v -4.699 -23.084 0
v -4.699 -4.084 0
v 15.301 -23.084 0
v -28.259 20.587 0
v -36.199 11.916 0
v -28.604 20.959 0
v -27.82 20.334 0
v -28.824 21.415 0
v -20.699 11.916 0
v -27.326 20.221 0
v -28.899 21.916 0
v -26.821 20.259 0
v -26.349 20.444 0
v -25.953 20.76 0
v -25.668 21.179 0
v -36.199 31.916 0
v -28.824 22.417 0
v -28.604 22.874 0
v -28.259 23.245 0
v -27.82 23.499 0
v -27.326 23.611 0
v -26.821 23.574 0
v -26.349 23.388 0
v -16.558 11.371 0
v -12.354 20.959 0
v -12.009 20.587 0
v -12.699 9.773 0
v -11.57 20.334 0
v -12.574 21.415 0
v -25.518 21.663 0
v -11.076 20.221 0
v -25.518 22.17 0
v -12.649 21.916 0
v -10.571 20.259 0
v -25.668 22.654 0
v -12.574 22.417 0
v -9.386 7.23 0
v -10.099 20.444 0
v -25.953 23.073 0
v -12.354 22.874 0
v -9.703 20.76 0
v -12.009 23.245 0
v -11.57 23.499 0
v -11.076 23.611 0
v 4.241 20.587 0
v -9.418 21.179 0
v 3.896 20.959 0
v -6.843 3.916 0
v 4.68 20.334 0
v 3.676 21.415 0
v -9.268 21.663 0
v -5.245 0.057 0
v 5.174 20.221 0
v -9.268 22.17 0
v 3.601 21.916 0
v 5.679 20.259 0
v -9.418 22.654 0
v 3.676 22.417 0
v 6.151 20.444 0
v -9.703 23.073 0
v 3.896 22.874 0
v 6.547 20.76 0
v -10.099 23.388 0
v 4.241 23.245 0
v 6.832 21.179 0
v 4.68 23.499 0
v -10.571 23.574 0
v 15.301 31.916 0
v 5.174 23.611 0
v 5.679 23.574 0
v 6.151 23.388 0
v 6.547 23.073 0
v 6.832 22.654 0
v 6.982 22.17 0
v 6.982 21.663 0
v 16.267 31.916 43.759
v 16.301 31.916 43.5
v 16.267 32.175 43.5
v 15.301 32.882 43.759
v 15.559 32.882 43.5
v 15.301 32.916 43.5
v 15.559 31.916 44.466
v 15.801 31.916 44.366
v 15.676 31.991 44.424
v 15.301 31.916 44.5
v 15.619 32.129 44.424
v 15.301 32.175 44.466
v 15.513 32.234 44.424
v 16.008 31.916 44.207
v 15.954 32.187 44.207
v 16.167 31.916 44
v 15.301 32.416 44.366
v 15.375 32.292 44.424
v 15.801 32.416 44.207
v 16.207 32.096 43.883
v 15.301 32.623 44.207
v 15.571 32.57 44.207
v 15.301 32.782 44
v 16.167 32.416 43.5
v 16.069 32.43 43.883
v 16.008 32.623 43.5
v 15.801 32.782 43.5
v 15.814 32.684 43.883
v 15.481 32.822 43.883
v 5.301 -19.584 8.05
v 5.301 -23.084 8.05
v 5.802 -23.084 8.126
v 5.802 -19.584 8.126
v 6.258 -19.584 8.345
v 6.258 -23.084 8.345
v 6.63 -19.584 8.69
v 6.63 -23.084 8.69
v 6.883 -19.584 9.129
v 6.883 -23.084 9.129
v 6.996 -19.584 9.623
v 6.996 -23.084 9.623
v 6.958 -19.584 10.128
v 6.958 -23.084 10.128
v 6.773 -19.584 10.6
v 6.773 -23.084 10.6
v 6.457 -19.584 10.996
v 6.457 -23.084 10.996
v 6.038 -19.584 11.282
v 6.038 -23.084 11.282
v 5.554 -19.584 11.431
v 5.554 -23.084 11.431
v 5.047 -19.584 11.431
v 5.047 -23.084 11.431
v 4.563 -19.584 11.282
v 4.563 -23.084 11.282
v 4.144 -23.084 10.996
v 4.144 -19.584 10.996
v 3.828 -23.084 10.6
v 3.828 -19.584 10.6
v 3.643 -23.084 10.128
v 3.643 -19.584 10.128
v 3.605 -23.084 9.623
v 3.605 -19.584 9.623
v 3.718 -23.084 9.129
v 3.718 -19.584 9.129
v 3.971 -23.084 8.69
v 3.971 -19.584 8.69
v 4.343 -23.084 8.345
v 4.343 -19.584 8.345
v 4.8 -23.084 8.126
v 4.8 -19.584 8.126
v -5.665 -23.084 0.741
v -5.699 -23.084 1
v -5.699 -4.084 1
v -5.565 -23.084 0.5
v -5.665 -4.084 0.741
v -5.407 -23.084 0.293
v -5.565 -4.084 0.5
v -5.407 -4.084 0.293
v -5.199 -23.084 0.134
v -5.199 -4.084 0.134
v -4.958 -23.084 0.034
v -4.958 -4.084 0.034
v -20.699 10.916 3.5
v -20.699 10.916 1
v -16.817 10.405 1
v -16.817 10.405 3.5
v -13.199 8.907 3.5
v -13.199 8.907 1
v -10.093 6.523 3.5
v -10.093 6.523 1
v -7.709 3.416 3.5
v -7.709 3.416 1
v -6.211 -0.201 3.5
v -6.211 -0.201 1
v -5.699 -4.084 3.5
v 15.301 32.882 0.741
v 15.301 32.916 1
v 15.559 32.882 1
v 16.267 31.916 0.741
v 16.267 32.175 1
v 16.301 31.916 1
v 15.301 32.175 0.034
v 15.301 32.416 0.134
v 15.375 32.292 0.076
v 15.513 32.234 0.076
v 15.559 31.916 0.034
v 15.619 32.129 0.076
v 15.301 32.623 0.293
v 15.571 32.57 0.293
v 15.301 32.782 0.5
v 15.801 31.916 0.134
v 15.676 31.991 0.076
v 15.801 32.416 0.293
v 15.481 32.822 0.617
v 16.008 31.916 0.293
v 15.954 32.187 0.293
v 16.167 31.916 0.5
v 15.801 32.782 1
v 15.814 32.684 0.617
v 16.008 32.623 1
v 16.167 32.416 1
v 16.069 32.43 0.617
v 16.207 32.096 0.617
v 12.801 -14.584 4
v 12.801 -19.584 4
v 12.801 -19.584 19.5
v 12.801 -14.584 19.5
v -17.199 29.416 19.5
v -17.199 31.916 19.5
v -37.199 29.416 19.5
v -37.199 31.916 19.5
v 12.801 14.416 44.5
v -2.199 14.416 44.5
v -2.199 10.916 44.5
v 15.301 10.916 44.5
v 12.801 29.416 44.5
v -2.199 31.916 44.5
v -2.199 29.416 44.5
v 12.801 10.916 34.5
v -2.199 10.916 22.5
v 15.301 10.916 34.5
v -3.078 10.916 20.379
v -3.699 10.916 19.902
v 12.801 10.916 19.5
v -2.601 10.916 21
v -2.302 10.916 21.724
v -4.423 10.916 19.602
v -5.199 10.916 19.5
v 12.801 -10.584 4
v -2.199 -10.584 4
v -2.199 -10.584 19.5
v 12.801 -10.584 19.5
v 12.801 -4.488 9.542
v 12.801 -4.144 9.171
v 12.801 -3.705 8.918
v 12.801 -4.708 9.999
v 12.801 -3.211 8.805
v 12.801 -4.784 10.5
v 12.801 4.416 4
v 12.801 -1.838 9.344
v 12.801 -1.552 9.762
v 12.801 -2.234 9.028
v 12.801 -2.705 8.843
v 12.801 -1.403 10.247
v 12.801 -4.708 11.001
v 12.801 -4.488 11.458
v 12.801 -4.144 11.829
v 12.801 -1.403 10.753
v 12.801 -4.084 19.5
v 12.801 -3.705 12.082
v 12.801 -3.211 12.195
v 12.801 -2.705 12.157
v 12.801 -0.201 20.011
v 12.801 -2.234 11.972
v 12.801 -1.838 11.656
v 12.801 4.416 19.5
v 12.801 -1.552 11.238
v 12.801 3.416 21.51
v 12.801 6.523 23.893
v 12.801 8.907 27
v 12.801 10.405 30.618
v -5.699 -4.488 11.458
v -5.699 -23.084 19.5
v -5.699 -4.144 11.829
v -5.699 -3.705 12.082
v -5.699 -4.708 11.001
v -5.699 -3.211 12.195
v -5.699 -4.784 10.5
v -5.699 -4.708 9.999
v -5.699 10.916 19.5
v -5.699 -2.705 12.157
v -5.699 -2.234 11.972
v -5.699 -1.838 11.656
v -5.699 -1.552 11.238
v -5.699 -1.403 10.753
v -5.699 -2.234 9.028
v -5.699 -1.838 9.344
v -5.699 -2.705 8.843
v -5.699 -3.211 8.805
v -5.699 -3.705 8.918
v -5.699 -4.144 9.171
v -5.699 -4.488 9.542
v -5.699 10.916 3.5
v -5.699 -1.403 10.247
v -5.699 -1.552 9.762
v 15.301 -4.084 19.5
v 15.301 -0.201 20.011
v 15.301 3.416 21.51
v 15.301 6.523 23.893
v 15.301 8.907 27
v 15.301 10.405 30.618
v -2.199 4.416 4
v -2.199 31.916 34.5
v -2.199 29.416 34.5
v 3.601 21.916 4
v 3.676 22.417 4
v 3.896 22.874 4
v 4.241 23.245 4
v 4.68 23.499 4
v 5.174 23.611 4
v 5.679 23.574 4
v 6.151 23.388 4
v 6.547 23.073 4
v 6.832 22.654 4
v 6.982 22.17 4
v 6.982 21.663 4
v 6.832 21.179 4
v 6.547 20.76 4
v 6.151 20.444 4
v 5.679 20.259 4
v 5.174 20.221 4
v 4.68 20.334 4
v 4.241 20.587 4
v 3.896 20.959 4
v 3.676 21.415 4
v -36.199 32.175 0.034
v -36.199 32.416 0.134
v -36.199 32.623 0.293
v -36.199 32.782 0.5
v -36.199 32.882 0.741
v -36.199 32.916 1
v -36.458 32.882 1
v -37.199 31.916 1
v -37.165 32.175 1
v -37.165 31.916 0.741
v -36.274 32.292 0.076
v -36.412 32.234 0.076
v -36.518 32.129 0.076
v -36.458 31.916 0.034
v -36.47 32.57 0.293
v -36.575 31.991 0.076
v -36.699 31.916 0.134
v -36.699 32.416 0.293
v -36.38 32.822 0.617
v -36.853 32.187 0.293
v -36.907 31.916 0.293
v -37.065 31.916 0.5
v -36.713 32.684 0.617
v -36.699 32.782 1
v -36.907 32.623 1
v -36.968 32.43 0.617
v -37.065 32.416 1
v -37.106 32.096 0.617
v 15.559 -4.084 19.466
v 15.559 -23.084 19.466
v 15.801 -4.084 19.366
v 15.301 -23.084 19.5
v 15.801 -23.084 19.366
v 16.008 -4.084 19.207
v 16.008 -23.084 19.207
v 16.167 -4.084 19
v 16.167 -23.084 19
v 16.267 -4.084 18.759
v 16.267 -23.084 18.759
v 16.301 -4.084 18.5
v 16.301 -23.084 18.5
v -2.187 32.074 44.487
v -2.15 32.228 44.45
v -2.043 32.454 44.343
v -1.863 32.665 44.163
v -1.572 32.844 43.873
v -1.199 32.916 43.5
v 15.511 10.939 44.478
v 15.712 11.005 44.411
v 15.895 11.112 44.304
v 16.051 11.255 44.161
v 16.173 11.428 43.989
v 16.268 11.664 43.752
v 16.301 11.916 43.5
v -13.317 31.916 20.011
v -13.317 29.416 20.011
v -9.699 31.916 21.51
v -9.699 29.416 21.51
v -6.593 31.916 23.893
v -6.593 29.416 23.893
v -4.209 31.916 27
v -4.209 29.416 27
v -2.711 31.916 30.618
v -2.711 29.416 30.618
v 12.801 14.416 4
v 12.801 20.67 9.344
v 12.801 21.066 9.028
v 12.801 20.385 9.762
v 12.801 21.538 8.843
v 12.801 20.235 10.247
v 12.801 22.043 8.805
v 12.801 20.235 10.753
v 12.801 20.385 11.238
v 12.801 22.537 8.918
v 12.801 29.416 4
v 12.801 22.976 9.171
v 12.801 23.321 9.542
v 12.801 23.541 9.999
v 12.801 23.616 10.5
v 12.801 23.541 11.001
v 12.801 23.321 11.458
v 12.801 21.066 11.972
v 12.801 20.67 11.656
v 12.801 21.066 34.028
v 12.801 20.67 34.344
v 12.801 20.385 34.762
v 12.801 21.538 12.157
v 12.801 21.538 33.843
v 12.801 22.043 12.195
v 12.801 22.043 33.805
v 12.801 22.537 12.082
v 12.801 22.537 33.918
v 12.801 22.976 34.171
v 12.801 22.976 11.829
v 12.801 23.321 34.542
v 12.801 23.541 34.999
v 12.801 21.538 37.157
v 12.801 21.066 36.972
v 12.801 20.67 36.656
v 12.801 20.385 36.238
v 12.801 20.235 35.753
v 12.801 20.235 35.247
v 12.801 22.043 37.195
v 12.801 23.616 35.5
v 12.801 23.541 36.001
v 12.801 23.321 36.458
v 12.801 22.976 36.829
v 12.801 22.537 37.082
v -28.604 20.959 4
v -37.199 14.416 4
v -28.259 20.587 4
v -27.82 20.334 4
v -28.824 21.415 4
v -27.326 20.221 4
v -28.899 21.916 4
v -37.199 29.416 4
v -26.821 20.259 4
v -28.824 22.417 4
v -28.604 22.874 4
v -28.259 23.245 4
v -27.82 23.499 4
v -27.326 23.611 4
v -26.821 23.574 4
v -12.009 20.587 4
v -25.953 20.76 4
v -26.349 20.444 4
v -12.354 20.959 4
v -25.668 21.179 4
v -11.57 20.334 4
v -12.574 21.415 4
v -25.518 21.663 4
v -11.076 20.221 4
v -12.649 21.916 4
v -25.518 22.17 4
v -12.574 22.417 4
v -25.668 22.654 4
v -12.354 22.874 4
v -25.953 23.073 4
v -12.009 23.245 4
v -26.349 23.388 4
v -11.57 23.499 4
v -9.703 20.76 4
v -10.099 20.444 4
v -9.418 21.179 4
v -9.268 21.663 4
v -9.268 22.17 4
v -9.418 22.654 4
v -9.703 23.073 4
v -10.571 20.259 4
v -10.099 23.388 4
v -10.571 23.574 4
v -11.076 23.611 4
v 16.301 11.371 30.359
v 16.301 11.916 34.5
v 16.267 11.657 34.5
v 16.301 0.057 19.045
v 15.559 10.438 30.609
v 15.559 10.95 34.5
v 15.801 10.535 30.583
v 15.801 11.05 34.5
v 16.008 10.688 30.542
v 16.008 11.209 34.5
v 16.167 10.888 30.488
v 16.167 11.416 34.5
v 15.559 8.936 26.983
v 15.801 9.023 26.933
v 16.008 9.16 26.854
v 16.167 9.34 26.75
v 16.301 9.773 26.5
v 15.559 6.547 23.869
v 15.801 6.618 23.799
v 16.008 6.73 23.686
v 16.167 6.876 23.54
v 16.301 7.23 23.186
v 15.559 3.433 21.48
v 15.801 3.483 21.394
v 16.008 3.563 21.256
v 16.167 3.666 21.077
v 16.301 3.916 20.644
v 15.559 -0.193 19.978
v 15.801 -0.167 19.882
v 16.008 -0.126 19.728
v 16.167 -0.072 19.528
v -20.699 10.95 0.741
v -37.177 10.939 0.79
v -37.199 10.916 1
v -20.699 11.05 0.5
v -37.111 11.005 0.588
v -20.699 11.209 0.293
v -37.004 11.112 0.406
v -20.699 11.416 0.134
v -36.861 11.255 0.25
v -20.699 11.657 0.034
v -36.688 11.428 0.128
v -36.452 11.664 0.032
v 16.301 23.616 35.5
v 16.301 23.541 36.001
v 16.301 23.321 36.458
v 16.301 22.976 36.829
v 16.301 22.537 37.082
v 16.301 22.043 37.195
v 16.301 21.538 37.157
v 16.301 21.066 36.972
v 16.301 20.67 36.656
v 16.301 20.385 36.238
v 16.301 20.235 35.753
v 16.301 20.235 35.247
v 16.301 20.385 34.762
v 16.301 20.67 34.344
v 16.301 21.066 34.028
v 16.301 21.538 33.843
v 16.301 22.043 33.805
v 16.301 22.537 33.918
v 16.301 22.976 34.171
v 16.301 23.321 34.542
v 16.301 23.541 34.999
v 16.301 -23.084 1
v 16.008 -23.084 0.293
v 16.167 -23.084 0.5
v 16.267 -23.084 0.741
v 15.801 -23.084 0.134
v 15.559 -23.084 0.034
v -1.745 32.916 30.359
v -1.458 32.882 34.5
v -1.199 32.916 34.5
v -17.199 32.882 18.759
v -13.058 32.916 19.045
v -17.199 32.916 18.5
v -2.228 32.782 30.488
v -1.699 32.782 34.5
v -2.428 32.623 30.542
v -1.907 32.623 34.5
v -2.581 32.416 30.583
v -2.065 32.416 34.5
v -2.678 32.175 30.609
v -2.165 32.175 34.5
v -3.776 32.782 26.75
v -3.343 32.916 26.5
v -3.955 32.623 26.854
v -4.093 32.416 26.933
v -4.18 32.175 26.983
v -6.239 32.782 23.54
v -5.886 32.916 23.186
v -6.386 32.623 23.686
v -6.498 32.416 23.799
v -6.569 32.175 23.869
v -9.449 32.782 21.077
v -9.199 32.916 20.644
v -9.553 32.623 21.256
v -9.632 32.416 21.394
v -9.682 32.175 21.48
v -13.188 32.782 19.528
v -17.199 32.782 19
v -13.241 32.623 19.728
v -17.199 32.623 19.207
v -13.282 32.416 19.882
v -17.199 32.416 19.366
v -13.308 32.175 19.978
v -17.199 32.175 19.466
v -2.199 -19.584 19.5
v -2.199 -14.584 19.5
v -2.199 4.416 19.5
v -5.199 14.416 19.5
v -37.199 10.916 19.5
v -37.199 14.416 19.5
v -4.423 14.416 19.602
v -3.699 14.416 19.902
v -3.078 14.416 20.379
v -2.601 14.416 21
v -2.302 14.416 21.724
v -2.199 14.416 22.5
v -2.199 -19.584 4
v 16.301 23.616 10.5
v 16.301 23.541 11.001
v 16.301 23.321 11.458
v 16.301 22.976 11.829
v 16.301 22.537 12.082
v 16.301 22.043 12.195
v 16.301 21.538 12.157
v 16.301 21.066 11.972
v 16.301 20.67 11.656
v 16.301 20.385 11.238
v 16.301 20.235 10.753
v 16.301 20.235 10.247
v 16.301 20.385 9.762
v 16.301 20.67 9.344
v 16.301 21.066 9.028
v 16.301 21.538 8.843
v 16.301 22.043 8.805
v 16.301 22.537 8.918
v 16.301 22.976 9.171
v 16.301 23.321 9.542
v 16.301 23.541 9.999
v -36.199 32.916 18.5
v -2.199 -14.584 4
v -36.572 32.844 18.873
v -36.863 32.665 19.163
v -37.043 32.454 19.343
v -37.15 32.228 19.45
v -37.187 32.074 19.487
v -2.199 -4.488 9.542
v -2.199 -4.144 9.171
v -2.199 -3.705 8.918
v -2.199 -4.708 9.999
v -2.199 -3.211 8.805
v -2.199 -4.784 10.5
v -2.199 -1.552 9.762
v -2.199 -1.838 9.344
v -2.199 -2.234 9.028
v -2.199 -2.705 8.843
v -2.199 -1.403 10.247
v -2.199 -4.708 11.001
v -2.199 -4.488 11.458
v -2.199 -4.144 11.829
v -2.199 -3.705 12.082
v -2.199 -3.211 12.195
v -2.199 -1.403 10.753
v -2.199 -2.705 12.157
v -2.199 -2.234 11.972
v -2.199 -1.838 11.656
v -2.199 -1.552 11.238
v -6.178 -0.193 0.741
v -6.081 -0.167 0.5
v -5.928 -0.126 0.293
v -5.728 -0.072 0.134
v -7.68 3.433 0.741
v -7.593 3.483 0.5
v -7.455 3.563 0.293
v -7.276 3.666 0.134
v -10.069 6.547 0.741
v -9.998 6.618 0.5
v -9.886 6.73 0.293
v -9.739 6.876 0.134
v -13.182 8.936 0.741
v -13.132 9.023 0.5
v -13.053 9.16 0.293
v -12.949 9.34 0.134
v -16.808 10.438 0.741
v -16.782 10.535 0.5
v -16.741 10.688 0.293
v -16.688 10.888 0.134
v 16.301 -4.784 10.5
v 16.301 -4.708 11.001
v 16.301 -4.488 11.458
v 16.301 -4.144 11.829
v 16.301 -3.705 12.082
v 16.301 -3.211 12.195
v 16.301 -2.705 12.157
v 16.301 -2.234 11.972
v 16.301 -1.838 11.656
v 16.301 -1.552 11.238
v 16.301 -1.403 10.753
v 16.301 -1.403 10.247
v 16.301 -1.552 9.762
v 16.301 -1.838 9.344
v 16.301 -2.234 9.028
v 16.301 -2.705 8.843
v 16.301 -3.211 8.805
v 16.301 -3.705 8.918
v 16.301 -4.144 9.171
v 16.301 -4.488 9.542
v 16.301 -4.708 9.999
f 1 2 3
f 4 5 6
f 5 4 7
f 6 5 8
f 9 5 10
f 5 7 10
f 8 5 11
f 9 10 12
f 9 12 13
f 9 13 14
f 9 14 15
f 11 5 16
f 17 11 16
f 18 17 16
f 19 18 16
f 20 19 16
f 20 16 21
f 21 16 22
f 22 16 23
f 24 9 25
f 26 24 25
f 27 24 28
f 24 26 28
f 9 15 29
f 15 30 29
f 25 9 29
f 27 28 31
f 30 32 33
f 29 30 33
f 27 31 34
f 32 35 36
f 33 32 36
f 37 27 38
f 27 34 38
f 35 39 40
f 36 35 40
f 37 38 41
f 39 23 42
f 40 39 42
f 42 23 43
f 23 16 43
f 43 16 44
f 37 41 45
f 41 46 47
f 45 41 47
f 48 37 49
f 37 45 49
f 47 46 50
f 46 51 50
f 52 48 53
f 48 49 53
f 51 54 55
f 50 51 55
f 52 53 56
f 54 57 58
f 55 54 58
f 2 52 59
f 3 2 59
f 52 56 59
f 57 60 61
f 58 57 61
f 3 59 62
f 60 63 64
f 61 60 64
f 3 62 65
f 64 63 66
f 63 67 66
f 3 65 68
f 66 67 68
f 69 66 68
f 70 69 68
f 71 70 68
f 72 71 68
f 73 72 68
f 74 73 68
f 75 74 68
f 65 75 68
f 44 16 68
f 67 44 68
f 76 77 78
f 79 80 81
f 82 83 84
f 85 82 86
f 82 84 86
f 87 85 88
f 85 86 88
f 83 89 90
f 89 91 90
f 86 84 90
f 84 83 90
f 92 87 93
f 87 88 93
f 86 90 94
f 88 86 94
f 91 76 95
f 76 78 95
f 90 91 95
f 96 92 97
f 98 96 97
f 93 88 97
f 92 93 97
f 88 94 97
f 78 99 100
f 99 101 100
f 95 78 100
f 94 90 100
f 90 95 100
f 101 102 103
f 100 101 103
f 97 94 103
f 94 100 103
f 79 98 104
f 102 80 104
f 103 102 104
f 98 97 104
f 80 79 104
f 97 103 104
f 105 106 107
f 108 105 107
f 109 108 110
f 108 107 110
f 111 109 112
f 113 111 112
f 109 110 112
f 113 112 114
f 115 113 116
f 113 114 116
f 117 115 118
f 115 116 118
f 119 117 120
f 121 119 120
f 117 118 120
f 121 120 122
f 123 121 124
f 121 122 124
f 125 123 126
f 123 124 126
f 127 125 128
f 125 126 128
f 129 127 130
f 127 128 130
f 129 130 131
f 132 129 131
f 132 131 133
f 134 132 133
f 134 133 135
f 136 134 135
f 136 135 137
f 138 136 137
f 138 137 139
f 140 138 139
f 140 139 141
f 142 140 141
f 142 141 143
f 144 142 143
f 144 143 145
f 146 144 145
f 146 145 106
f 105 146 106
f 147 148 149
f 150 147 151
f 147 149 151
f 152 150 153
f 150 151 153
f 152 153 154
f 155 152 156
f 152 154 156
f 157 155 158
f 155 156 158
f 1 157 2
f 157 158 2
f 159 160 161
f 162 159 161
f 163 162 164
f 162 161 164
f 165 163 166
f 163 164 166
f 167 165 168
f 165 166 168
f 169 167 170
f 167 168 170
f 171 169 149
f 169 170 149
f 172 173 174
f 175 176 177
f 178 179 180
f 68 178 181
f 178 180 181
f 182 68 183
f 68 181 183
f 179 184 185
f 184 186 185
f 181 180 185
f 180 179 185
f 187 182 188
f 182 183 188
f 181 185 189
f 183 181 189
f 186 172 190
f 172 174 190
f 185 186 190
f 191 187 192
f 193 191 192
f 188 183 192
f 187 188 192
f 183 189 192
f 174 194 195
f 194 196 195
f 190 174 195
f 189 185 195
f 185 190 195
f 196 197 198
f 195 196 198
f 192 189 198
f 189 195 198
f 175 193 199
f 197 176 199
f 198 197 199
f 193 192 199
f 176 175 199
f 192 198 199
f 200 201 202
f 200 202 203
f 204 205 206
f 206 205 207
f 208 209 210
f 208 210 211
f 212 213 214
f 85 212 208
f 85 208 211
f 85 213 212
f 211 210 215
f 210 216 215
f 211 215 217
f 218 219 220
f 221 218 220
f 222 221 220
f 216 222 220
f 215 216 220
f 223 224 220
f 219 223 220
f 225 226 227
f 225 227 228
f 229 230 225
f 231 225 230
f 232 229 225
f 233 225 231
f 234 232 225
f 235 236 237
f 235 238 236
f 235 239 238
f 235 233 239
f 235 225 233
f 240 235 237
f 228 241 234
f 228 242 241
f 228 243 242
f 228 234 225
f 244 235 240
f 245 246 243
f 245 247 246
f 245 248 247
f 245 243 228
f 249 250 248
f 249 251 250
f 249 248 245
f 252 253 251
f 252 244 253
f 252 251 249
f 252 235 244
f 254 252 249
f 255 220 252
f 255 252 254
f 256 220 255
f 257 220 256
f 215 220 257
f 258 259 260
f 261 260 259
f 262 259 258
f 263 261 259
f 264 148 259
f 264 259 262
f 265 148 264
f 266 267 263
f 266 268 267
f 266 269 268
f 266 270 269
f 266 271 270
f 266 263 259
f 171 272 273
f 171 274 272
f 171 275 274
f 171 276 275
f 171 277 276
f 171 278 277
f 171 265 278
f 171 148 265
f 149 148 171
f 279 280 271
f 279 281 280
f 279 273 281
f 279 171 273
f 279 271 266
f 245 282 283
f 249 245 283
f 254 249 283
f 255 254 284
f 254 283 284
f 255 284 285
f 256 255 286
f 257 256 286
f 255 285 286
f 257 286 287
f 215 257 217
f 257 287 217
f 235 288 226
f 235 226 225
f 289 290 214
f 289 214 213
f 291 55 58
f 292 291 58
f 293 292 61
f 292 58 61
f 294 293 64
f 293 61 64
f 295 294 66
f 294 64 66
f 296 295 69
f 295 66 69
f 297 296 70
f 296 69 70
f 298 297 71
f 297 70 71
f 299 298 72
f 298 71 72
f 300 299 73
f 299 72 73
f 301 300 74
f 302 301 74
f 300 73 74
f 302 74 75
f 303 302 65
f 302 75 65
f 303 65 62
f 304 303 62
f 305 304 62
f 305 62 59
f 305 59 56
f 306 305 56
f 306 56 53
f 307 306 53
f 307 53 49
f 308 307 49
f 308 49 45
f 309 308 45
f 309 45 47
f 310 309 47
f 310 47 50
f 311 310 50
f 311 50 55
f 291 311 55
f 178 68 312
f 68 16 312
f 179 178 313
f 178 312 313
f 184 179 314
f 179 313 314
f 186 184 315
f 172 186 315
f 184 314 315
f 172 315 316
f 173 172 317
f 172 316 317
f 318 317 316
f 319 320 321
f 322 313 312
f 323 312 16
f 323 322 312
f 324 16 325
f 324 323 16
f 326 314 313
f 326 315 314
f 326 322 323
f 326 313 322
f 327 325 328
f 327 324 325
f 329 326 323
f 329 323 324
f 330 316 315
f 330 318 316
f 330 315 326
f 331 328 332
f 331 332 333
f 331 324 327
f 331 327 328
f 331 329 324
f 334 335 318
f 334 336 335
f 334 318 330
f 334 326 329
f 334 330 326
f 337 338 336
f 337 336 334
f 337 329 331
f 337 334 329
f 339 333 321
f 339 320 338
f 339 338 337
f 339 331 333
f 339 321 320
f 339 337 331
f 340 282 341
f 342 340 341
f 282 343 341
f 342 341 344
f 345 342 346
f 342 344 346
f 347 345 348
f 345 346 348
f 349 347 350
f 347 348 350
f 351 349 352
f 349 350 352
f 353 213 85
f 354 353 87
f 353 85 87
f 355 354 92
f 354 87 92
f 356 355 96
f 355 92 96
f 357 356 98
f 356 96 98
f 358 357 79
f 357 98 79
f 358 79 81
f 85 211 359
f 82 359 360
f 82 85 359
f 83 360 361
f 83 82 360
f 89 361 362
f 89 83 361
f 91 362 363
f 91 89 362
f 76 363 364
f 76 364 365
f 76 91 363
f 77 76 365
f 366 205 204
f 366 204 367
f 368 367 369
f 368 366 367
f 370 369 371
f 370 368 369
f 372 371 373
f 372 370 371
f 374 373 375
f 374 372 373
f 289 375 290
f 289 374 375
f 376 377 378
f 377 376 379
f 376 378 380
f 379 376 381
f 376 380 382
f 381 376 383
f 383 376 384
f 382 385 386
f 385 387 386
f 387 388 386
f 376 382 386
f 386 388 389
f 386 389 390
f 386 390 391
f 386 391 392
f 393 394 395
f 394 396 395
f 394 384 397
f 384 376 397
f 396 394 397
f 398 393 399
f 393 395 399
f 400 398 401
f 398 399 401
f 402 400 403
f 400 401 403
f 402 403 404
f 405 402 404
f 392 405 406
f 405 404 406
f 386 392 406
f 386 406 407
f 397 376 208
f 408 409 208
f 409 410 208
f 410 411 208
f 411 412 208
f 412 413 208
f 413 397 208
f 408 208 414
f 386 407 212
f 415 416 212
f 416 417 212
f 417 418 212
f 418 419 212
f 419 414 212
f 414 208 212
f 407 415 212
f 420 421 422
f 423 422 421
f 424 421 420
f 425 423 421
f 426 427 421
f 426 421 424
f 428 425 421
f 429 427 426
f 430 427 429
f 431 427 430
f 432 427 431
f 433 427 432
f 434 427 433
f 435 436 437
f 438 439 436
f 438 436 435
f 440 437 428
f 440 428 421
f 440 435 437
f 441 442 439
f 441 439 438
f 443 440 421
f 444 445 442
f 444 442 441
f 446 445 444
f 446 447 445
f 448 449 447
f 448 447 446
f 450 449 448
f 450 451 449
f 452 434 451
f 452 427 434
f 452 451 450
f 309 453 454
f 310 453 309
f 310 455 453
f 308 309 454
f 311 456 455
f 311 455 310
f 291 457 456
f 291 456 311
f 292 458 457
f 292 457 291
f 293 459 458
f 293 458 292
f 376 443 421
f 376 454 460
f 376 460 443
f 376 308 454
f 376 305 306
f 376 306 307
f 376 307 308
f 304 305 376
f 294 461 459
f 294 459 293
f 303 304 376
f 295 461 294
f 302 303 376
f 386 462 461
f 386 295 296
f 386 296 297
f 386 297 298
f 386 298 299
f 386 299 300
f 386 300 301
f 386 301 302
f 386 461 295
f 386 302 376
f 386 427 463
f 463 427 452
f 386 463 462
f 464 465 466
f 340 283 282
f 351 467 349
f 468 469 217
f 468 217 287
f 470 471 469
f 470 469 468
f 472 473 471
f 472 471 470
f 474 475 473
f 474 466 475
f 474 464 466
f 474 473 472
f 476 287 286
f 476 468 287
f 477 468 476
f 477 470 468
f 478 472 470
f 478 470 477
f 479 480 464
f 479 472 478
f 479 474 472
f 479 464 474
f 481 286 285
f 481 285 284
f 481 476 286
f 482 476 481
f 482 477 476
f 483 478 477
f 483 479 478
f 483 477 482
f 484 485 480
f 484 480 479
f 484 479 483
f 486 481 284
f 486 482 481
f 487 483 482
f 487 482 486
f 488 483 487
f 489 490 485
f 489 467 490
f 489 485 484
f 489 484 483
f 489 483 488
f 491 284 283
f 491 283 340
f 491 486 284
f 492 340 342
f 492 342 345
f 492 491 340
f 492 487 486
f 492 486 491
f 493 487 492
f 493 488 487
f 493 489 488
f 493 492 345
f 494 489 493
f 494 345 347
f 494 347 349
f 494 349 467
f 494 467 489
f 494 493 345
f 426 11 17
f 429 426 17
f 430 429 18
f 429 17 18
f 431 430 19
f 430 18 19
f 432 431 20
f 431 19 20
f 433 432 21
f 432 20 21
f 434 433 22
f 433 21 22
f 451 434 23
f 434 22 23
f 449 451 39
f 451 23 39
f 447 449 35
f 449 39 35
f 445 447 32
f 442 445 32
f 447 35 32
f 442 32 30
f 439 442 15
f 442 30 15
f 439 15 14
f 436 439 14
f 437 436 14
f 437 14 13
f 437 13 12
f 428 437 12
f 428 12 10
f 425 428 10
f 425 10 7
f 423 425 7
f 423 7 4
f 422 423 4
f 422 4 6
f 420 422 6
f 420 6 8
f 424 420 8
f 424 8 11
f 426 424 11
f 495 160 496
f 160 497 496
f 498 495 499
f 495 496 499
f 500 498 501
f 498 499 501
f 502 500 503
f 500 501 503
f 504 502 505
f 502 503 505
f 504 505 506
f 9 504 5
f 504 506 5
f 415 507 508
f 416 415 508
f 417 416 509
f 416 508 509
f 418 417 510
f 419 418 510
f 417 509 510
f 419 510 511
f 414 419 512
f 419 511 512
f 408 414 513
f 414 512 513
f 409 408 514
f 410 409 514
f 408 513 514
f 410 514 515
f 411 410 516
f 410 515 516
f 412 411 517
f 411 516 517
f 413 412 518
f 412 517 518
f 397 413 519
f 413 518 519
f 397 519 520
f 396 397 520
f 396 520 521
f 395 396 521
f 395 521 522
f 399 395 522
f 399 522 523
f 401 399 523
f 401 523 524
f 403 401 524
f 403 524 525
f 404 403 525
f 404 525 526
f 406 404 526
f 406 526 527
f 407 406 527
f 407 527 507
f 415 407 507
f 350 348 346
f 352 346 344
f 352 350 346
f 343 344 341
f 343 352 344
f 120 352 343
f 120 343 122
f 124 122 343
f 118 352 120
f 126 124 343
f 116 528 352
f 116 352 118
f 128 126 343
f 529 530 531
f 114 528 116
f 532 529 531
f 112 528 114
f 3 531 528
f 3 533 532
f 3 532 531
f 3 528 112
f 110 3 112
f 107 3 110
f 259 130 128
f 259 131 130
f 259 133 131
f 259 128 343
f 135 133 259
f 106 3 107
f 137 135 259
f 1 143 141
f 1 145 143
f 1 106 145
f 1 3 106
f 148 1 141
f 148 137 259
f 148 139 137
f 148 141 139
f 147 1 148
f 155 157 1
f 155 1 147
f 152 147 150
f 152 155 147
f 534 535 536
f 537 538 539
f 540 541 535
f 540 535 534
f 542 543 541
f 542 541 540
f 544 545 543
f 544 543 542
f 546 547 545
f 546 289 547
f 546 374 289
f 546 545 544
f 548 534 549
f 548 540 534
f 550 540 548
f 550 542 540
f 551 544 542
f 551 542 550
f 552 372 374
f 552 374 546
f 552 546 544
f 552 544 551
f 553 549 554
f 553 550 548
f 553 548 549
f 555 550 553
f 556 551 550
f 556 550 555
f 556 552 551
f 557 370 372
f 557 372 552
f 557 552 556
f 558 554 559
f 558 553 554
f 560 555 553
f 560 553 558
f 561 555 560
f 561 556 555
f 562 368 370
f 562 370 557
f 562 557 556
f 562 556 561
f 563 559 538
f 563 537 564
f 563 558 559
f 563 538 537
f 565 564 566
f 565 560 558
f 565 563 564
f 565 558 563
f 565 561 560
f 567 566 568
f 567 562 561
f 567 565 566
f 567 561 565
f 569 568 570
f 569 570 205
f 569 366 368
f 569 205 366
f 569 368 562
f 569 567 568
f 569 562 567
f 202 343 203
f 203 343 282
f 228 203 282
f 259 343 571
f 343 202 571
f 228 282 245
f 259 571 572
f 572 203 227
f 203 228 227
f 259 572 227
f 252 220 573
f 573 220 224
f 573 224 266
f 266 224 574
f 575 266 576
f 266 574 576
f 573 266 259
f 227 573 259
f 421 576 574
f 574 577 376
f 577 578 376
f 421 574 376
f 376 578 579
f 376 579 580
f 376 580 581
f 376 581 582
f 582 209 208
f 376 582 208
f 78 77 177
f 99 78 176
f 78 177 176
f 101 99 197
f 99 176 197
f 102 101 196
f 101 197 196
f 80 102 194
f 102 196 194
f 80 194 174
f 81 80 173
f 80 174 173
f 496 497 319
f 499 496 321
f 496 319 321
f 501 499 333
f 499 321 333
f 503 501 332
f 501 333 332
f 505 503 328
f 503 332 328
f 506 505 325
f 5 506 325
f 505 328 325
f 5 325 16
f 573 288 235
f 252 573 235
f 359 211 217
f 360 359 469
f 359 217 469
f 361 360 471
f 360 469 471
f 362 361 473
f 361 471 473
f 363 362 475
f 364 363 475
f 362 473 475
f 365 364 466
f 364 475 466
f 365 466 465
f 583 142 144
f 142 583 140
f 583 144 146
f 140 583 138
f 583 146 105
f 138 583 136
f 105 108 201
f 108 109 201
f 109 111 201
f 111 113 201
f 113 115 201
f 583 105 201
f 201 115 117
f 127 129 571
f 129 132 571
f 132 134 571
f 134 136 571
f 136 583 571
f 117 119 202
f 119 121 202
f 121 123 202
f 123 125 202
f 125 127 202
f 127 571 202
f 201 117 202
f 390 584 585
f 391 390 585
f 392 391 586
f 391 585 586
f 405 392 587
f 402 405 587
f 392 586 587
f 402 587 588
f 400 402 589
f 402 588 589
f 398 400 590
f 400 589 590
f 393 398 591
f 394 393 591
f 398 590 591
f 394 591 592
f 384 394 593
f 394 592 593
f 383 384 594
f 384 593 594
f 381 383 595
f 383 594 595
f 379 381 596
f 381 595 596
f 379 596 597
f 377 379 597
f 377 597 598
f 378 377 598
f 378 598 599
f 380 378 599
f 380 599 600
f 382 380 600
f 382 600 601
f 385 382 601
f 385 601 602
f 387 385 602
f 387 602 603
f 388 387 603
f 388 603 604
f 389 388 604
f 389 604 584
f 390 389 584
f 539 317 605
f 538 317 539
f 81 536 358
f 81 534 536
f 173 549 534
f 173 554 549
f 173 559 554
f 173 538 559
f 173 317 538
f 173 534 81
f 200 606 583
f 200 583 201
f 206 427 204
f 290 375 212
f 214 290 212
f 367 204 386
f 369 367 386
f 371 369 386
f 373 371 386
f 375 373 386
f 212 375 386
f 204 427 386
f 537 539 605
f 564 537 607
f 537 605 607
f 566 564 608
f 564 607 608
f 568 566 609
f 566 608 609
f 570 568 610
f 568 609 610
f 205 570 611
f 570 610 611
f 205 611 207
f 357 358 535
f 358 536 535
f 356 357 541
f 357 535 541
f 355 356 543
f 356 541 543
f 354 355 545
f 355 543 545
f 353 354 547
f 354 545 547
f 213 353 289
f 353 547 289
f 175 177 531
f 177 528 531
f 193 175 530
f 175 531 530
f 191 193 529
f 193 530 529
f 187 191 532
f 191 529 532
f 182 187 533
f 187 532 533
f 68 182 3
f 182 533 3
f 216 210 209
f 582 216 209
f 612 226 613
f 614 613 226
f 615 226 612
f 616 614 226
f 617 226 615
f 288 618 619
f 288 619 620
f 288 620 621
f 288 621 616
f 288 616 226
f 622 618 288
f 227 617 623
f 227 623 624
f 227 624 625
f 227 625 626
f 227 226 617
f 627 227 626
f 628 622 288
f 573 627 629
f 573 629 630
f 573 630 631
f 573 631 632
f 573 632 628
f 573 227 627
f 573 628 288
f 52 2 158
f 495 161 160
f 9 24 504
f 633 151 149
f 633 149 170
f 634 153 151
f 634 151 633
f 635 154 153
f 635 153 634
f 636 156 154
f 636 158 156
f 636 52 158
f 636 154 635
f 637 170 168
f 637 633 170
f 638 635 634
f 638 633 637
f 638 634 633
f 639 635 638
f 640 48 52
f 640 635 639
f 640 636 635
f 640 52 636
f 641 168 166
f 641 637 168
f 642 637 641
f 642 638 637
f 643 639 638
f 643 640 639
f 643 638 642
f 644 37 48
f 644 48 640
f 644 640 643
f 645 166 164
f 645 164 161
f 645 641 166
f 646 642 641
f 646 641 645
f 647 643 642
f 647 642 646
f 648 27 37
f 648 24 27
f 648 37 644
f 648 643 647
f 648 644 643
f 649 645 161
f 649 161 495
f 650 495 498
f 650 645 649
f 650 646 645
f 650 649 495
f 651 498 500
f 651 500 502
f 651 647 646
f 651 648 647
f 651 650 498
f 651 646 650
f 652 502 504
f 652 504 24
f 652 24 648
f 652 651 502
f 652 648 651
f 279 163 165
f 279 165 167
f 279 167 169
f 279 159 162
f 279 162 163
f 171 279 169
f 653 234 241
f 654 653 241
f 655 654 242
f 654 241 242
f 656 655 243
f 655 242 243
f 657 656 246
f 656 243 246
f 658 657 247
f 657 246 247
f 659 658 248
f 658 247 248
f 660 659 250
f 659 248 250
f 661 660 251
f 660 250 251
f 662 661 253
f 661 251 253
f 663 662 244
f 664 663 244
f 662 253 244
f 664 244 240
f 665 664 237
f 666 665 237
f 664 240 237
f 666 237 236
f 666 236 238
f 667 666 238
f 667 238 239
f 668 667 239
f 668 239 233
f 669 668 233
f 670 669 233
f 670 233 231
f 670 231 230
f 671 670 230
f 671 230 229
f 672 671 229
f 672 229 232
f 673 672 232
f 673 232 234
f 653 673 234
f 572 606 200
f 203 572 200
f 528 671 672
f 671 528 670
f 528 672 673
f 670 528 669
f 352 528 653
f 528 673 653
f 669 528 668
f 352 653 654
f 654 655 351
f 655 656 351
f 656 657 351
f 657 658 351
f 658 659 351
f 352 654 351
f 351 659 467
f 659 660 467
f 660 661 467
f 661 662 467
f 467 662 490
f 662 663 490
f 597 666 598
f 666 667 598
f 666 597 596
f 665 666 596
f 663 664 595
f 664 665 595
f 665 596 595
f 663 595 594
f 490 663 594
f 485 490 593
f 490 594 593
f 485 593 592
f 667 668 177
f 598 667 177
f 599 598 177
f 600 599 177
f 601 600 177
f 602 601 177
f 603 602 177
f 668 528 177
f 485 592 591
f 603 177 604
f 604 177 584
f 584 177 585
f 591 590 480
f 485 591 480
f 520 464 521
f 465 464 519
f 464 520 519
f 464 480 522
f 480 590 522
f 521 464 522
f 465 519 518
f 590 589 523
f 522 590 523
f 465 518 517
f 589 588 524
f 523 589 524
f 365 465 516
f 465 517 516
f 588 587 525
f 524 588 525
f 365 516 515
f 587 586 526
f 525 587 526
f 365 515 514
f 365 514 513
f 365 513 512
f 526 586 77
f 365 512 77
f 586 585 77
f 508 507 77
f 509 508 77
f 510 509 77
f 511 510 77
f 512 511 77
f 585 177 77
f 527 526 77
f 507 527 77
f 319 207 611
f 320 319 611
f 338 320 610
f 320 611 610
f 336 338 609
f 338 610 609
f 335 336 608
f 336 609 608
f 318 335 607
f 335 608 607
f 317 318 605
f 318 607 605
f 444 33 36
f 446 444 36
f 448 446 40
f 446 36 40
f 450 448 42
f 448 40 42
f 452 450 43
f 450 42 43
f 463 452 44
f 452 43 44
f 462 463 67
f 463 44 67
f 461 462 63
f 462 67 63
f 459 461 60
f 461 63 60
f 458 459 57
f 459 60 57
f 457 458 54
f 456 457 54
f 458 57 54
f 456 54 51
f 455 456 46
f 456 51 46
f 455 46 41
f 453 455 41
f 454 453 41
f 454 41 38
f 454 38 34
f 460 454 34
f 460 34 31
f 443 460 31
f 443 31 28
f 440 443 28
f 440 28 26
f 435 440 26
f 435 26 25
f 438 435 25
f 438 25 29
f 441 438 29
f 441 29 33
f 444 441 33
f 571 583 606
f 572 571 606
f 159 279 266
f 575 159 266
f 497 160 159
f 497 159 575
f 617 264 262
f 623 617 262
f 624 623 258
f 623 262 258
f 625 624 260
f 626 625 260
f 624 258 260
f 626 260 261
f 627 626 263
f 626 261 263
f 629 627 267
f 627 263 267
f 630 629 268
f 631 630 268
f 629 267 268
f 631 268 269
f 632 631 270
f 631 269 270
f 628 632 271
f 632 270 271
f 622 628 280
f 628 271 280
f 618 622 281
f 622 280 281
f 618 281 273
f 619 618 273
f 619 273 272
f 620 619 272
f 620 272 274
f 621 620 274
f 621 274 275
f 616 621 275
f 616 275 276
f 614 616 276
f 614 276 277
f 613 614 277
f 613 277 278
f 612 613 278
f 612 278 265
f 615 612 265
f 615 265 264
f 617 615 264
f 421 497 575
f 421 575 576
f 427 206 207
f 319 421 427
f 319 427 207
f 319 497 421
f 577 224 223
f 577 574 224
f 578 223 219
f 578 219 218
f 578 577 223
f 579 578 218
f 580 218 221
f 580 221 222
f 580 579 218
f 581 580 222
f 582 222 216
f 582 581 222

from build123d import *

# Parameters (mm, degrees)
BOSS_EXTRUDE1_DEPTH = 19.5
SKETCH3_W           = 18.5
SKETCH3_H           = 22
BOSS_EXTRUDE2_DEPTH = 25
SKETCH5_W           = 50
SKETCH5_H           = 15
SKETCH5_W_2         = 15
SKETCH5_H_2         = 5
CUT_EXTRUDE1_DEPTH  = 40.5
BOSS_EXTRUDE4_DEPTH = 3.5
BOSS_EXTRUDE5_DEPTH = 3.5
BOSS_EXTRUDE6_DEPTH = 3.5
FILLET3_R           = 3
SKETCH12_R          = 1.7
CUT_EXTRUDE4_DEPTH  = 5
SKETCH13_R          = 1.7
CUT_EXTRUDE5_DEPTH  = 45
SKETCH14_R          = 1.7
CUT_EXTRUDE6_DEPTH  = 45
SKETCH15_R          = 1.7
CUT_EXTRUDE7_DEPTH  = 4
FILLET4_R           = 1


with BuildPart() as part:
    # Sketch1 → Boss-Extrude1 (new body)
    with BuildSketch(Plane.XY):
        Polygon((-5.699410772, 32.916253451), (16.300589228, 32.916253451), (16.300589228, -23.083746549), (-5.699410772, -23.083746549), (-5.699410772, 10.916253451), (-37.199410772, 10.916253451), (-37.199410772, 32.916253451), align=None)
    extrude(amount=BOSS_EXTRUDE1_DEPTH)

    # Sketch3 → Boss-Extrude2 (add)
    with BuildSketch(Plane.XY.offset(19.5)):
        with Locations((7.050589228, 21.916253451)):
            Rectangle(SKETCH3_W, SKETCH3_H)
    extrude(amount=BOSS_EXTRUDE2_DEPTH)

    # Sketch5 → Cut-Extrude1 (cut)
    with BuildSketch(Plane.XY.offset(44.5)):
        with Locations((-12.199410772, 21.916253451)):
            Rectangle(SKETCH5_W, SKETCH5_H)
        with Locations((5.300589228, -3.083746549)):
            Rectangle(SKETCH5_W_2, SKETCH5_H)
        with Locations((5.300589228, -17.083746549)):
            Rectangle(SKETCH5_W_2, SKETCH5_H_2)
    extrude(amount=-CUT_EXTRUDE1_DEPTH, mode=Mode.SUBTRACT)

    # Sketch7 → Boss-Extrude4 (add)
    with BuildSketch(Plane(origin=(16.300589228, 0, 0), x_dir=(0, 0, -1), z_dir=(1, 0, 0))):
        with BuildLine():
            Line((-34.5, 10.916253451), (-19.5, 10.916253451))
            Line((-19.5, 10.916253451), (-19.5, -4.083746549))
            ThreePointArc((-19.5, -4.083746549), (-23.893398282, 6.522855169), (-34.5, 10.916253451))
        make_face()
    extrude(amount=-BOSS_EXTRUDE4_DEPTH)

    # Sketch8 → Boss-Extrude5 (add)
    with BuildSketch(Plane(origin=(0, 0, 0), x_dir=(-1, 0, 0), z_dir=(0, 0, -1))):
        with BuildLine():
            Line((5.699410772, 10.916253451), (20.699410772, 10.916253451))
            ThreePointArc((20.699410772, 10.916253451), (10.092809055, 6.522855169), (5.699410772, -4.083746549))
            Line((5.699410772, -4.083746549), (5.699410772, 10.916253451))
        make_face()
    extrude(amount=-BOSS_EXTRUDE5_DEPTH)

    # Sketch9 → Boss-Extrude6 (add)
    with BuildSketch(Plane(origin=(0, 32.916253451, 0), x_dir=(1, 0, 0), z_dir=(0, 1, 0))):
        with BuildLine():
            Line((-2.199410772, -34.5), (-2.199410772, -19.5))
            Line((-2.199410772, -19.5), (-17.199410772, -19.5))
            ThreePointArc((-17.199410772, -19.5), (-6.592809055, -23.893398282), (-2.199410772, -34.5))
        make_face()
    extrude(amount=-BOSS_EXTRUDE6_DEPTH)

    # Fillet3
    fillet3_edges = [part.edges().sort_by_distance(p)[0] for p in [
        (-2.199410772, 12.666253451, 19.5),
    ]]
    fillet(fillet3_edges, radius=FILLET3_R)

    # Sketch12 → Cut-Extrude4 (cut)
    with BuildSketch(Plane(origin=(0, 0, 0), x_dir=(-1, 0, 0), z_dir=(0, 0, -1))):
        with Locations((-5.300589228, 21.916253451)):
            Circle(SKETCH12_R)
        with Locations((10.949410772, 21.916253451)):
            Circle(SKETCH12_R)
        with Locations((27.199410772, 21.916253451)):
            Circle(SKETCH12_R)
    extrude(amount=-CUT_EXTRUDE4_DEPTH, mode=Mode.SUBTRACT)

    # Sketch13 → Cut-Extrude5 (cut)
    with BuildSketch(Plane.ZY.offset(5.699410772)):
        with Locations(Location((10.5, -3.083746549, 0), (0, 0, 270))):
            Circle(SKETCH13_R)
    extrude(amount=-CUT_EXTRUDE5_DEPTH, mode=Mode.SUBTRACT)

    # Sketch14 → Cut-Extrude6 (cut)
    with BuildSketch(Plane(origin=(16.300589228, 0, 0), x_dir=(0, 0, -1), z_dir=(1, 0, 0))):
        with Locations(Location((-10.5, 21.916253451, 0), (0, 0, 90))):
            Circle(SKETCH14_R)
        with Locations(Location((-35.5, 21.916253451, 0), (0, 0, 90))):
            Circle(SKETCH14_R)
    extrude(amount=-CUT_EXTRUDE6_DEPTH, mode=Mode.SUBTRACT)

    # Sketch15 → Cut-Extrude7 (cut)
    with BuildSketch(Plane.XZ.offset(23.083746549)):
        with Locations(Location((5.300589228, 9.75, 0), (0, 0, 270))):
            Circle(SKETCH15_R)
    extrude(amount=-CUT_EXTRUDE7_DEPTH, mode=Mode.SUBTRACT)

    # Fillet4
    fillet4_edges = [part.edges().sort_by_distance(p)[0] for p in [
        (-5.699410772, -13.583746549, 0),
        (-10.092809055, 6.522855169, 0),
        (-27.199410772, 32.916253451, 19.5),
        (-6.592809055, 32.916253451, 23.893398282),
        (16.300589228, 32.916253451, 22.25),
        (-37.199410772, 32.916253451, 9.75),
        (16.300589228, -13.583746549, 19.5),
        (16.300589228, 10.916253451, 39.5),
        (-2.199410772, 32.916253451, 39.5),
        (16.300589228, 21.916253451, 44.5),
        (7.050589228, 32.916253451, 44.5),
        (-10.449410772, 32.916253451, 0),
        (16.300589228, 4.916253451, 0),
        (-28.949410772, 10.916253451, 0),
        (-37.199410772, 21.916253451, 0),
        (16.300589228, 6.522855169, 23.893398282),
    ]]
    fillet(fillet4_edges, radius=FILLET4_R)


solid = part.part
